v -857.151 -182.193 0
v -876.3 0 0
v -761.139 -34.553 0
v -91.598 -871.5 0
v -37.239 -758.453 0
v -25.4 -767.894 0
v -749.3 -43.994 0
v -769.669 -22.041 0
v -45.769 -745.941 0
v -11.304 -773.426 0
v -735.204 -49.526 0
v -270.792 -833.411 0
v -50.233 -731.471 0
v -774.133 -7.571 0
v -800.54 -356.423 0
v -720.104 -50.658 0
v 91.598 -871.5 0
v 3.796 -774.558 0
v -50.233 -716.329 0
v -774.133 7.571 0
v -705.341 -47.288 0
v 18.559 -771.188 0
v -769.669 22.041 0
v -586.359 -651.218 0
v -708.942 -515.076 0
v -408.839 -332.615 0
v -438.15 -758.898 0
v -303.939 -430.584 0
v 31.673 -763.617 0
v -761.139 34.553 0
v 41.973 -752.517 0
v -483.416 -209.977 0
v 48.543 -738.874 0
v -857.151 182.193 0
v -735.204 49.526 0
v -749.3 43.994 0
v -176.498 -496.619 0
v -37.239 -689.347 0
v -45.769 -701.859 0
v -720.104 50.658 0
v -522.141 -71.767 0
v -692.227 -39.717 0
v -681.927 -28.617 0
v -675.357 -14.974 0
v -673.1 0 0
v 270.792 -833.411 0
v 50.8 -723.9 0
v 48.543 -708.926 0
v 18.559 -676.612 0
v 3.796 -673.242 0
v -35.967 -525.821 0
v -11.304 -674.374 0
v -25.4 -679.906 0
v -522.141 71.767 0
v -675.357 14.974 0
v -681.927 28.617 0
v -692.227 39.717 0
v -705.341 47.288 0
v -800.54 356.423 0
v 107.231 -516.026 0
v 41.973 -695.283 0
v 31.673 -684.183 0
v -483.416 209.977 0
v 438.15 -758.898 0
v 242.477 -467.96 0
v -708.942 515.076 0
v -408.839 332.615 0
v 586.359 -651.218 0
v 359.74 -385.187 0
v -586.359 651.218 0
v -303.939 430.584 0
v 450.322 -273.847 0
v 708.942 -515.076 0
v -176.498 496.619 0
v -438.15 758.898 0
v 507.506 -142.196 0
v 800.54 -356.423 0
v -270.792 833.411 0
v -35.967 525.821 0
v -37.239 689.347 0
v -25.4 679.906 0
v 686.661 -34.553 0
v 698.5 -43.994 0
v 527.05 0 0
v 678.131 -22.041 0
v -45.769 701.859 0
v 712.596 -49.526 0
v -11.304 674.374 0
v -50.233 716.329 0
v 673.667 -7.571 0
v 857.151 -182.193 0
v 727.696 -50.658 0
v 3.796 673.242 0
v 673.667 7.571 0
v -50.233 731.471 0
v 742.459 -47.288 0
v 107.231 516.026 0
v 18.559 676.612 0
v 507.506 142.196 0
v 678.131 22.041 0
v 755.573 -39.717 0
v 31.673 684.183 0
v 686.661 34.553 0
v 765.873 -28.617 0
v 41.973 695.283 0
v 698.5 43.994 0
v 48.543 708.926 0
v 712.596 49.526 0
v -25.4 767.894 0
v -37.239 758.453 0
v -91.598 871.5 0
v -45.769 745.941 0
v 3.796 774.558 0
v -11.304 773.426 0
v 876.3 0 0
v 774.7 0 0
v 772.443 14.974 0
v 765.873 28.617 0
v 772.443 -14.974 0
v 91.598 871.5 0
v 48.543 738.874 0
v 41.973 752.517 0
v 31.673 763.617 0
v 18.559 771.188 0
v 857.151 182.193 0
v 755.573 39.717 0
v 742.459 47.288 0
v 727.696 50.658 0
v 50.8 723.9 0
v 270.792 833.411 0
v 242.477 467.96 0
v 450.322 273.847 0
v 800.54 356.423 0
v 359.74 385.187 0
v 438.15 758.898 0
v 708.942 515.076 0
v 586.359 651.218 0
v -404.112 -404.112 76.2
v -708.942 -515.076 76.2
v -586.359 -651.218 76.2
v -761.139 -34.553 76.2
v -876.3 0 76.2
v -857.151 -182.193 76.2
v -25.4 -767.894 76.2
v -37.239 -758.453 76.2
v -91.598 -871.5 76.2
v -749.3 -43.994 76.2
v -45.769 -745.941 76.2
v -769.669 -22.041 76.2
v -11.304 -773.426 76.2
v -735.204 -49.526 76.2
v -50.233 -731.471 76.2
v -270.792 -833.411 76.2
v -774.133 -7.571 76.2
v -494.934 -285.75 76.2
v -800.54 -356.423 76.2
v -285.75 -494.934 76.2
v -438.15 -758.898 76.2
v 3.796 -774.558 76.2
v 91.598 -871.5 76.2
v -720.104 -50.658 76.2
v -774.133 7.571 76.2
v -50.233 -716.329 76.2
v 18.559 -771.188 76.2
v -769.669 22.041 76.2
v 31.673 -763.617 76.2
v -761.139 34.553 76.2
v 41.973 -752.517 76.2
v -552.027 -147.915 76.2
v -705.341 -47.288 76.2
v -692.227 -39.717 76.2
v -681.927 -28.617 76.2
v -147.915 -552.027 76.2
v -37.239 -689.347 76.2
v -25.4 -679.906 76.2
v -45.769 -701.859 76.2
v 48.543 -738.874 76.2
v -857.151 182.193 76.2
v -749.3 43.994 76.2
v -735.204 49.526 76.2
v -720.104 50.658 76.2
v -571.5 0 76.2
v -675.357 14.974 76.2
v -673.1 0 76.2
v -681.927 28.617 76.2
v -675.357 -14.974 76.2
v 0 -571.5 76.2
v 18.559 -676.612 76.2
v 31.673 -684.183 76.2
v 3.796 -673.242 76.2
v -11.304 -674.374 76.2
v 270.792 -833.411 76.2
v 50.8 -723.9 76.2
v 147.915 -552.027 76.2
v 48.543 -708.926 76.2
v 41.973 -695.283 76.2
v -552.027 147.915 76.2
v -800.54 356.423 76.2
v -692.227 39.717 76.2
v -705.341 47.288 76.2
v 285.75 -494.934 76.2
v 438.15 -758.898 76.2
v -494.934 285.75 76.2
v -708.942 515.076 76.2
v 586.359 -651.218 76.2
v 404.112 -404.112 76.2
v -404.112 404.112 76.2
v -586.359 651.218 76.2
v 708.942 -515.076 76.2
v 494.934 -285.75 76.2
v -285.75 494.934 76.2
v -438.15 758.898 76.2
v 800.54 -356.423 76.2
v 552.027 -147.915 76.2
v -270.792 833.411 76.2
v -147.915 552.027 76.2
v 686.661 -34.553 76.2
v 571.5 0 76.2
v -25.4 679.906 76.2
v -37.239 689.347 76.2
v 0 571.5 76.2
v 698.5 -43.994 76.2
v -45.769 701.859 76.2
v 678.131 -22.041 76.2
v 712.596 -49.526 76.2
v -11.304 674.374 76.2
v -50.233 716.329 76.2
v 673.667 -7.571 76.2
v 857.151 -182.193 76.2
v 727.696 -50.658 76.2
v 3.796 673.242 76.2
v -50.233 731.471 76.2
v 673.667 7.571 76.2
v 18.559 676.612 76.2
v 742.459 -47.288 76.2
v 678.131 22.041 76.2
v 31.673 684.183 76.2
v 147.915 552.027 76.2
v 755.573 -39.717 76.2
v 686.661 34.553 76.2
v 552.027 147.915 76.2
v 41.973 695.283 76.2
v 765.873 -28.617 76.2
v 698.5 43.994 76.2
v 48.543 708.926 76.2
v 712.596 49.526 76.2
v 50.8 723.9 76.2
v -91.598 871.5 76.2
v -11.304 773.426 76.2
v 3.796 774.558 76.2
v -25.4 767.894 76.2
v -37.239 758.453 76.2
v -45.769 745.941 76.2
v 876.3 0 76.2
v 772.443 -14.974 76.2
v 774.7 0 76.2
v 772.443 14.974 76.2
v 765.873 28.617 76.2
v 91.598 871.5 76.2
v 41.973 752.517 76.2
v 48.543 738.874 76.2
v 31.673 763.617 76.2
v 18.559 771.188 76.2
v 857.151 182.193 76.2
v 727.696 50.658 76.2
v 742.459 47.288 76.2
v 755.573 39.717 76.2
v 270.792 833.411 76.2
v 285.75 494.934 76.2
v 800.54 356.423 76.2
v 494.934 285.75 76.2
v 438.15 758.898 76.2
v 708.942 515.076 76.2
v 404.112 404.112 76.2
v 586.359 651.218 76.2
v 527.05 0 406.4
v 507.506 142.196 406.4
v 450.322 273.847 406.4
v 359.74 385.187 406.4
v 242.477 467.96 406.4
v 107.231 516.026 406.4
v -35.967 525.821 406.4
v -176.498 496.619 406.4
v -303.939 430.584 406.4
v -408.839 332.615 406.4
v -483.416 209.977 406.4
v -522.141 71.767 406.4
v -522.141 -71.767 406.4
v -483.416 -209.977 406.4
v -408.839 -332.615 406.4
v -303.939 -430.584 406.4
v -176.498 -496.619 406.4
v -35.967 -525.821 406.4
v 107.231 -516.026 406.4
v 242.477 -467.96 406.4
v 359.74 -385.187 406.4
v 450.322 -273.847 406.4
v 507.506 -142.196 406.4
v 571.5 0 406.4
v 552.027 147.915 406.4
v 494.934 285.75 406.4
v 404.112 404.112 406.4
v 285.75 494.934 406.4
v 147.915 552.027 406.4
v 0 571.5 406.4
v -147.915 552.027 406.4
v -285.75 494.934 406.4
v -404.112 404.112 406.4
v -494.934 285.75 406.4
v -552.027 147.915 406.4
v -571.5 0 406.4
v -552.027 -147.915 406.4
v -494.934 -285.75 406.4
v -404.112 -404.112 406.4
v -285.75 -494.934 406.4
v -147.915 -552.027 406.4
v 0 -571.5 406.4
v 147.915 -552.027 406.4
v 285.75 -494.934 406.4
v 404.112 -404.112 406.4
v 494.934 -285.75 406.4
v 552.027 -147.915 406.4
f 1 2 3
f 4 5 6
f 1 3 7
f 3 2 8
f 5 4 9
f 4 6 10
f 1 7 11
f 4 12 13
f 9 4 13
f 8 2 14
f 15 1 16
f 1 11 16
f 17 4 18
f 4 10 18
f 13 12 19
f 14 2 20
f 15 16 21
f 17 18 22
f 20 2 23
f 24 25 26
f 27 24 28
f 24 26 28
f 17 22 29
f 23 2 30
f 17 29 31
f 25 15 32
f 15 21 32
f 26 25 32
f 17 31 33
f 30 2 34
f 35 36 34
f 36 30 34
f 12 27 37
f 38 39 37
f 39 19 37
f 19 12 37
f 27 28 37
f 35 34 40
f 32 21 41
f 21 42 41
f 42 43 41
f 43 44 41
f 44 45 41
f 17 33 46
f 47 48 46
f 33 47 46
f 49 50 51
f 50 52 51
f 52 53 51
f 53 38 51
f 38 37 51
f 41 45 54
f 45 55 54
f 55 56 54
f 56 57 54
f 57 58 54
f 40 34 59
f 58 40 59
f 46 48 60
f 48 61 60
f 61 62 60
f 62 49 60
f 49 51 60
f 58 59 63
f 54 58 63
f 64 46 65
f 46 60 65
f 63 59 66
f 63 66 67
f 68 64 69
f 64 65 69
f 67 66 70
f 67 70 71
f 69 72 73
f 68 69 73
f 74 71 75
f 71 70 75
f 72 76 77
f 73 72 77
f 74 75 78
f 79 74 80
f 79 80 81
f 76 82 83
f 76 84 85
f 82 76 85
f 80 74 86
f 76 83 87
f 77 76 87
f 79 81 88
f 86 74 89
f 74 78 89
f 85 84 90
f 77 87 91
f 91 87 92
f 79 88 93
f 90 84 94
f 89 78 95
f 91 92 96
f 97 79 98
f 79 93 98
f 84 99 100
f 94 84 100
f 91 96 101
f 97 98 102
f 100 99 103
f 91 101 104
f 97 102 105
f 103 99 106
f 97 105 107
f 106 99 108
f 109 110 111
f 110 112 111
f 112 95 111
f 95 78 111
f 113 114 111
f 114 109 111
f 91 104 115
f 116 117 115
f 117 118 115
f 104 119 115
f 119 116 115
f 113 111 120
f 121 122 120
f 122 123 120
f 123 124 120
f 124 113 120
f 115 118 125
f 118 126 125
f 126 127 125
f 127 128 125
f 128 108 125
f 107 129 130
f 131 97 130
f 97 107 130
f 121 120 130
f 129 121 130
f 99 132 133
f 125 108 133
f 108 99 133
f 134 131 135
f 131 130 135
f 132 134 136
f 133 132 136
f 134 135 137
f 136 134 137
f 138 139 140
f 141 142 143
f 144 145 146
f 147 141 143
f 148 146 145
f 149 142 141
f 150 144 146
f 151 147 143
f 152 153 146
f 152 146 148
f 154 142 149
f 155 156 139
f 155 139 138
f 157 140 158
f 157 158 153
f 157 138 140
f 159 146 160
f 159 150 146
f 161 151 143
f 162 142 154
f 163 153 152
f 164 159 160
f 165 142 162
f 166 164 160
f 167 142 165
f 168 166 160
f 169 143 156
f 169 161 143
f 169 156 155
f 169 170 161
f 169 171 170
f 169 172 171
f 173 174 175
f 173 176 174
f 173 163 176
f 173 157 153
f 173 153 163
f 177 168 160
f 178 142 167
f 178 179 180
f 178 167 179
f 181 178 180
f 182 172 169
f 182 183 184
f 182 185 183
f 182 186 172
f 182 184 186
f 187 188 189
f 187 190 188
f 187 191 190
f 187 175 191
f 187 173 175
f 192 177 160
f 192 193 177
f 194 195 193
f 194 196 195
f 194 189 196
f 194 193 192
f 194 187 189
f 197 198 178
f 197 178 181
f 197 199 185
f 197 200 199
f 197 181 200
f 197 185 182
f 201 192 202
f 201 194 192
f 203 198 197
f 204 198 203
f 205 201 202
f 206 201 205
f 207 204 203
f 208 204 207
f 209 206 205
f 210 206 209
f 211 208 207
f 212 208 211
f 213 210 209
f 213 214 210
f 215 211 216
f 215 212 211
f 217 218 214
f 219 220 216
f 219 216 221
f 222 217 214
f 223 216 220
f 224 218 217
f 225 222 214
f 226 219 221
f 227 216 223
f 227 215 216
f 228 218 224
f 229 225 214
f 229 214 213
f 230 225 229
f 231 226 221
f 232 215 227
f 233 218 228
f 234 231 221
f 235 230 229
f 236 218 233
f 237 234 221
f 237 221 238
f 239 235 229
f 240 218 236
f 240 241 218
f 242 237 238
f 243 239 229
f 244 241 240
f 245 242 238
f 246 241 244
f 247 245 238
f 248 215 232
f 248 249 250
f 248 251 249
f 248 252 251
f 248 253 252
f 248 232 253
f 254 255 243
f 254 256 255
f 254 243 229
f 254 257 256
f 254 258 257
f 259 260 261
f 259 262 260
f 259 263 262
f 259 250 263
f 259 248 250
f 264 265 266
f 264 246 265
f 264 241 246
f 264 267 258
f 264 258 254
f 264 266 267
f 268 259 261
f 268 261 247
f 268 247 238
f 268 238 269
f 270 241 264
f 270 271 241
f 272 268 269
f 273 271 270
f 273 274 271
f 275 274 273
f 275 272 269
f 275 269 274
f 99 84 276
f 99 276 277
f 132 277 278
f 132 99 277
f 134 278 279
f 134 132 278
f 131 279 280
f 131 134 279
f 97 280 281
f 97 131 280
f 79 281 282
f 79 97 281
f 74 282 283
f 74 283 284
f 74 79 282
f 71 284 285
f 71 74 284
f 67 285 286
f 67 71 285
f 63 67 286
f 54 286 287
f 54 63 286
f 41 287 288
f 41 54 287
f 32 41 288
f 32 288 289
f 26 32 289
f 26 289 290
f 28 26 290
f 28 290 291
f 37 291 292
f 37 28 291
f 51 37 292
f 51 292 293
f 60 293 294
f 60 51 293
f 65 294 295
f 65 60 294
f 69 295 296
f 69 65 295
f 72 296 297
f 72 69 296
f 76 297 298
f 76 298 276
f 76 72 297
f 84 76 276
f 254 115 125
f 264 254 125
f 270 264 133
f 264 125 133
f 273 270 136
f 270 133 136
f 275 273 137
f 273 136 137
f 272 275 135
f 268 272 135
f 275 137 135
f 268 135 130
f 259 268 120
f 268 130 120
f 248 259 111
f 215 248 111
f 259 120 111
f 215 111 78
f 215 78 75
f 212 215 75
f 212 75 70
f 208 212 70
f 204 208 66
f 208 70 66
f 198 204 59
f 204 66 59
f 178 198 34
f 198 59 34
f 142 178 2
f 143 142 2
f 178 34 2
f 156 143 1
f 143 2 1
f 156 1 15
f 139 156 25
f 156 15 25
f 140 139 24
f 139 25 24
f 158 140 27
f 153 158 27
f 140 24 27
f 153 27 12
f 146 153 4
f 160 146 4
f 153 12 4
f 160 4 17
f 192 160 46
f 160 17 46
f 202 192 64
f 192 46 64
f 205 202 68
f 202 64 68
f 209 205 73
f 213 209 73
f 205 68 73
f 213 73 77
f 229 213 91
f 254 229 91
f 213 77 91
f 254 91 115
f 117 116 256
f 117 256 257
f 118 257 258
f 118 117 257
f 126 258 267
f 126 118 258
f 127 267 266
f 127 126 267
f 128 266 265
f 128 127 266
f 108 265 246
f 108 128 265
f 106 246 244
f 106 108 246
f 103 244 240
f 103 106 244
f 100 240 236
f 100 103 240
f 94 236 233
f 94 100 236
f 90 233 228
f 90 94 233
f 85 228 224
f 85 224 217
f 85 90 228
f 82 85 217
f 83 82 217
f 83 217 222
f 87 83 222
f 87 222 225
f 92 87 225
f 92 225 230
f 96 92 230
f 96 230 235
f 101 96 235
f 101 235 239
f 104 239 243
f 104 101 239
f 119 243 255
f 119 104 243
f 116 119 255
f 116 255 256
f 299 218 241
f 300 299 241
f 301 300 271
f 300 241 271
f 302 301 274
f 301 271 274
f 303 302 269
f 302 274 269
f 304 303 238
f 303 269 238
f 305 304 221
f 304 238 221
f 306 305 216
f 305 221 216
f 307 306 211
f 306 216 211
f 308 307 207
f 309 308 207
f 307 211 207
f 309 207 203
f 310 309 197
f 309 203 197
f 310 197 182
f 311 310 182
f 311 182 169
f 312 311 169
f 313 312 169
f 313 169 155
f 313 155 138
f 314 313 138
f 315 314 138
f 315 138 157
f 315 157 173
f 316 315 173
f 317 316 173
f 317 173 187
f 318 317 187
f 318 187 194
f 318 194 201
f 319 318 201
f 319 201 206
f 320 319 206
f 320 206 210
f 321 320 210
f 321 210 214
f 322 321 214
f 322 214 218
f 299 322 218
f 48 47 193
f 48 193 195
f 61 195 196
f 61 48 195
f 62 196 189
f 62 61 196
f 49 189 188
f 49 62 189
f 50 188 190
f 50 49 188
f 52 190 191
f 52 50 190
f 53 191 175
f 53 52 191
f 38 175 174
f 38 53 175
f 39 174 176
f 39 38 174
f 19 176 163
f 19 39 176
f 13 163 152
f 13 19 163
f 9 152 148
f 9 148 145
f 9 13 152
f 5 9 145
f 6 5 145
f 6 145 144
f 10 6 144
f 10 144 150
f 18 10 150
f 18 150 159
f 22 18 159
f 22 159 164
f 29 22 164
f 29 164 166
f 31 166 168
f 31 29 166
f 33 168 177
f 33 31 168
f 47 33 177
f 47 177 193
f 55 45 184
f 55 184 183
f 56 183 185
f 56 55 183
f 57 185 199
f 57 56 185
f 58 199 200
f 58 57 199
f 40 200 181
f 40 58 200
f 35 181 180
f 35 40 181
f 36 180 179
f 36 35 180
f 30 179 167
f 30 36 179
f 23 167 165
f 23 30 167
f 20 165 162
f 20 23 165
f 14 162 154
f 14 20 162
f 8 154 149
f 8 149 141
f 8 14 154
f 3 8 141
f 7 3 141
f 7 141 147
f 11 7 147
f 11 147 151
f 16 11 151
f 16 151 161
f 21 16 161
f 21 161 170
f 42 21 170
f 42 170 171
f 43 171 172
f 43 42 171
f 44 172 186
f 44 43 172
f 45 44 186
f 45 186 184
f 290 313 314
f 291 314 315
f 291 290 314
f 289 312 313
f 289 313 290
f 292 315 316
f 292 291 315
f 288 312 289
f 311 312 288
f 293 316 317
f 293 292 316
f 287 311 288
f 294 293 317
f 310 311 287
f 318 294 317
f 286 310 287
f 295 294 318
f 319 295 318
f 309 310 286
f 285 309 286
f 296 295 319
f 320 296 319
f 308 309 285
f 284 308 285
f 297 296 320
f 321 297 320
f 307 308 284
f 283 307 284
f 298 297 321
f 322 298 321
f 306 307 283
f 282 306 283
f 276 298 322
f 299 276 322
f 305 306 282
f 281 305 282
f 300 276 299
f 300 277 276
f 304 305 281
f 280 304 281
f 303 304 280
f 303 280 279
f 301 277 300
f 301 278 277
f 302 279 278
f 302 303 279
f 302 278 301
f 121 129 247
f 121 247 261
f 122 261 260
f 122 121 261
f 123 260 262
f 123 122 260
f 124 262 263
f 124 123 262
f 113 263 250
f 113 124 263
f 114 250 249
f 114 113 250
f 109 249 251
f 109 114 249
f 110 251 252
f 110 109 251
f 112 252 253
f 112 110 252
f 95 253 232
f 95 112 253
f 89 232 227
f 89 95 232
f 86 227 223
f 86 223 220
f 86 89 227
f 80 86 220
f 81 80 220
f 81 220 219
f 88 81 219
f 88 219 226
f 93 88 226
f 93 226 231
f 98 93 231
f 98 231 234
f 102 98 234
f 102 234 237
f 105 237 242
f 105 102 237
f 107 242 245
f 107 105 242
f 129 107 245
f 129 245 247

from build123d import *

# Parameters (mm, degrees)
F0_R     = 876.3
F0_R_2   = 50.8
F0_R_3   = 571.5
F1_DEPTH = 76.2
F0_R_4   = 527.05
F2_DEPTH = 406.4


# Not quite as in the source:
# - a feature names something its author has since deleted; it is built from what else it names


with BuildPart() as f1:
    # F0 (on Top) → F1 (new body)
    with BuildSketch(Plane.XY):
        Circle(F0_R)
        with Locations((0, -723.9)):
            Circle(F0_R_2, mode=Mode.SUBTRACT)
        with Locations((-723.9, 0)):
            Circle(F0_R_2, mode=Mode.SUBTRACT)
        Circle(F0_R_3, mode=Mode.SUBTRACT)
        with Locations((723.9, 0)):
            Circle(F0_R_2, mode=Mode.SUBTRACT)
        with Locations((0, 723.9)):
            Circle(F0_R_2, mode=Mode.SUBTRACT)
    extrude(amount=F1_DEPTH)

    # F0 (on Top) → F2 (join)
    with BuildSketch(Plane.XY):
        Circle(F0_R_3)
        Circle(F0_R_4, mode=Mode.SUBTRACT)
    extrude(amount=F2_DEPTH)


solid = f1.part
